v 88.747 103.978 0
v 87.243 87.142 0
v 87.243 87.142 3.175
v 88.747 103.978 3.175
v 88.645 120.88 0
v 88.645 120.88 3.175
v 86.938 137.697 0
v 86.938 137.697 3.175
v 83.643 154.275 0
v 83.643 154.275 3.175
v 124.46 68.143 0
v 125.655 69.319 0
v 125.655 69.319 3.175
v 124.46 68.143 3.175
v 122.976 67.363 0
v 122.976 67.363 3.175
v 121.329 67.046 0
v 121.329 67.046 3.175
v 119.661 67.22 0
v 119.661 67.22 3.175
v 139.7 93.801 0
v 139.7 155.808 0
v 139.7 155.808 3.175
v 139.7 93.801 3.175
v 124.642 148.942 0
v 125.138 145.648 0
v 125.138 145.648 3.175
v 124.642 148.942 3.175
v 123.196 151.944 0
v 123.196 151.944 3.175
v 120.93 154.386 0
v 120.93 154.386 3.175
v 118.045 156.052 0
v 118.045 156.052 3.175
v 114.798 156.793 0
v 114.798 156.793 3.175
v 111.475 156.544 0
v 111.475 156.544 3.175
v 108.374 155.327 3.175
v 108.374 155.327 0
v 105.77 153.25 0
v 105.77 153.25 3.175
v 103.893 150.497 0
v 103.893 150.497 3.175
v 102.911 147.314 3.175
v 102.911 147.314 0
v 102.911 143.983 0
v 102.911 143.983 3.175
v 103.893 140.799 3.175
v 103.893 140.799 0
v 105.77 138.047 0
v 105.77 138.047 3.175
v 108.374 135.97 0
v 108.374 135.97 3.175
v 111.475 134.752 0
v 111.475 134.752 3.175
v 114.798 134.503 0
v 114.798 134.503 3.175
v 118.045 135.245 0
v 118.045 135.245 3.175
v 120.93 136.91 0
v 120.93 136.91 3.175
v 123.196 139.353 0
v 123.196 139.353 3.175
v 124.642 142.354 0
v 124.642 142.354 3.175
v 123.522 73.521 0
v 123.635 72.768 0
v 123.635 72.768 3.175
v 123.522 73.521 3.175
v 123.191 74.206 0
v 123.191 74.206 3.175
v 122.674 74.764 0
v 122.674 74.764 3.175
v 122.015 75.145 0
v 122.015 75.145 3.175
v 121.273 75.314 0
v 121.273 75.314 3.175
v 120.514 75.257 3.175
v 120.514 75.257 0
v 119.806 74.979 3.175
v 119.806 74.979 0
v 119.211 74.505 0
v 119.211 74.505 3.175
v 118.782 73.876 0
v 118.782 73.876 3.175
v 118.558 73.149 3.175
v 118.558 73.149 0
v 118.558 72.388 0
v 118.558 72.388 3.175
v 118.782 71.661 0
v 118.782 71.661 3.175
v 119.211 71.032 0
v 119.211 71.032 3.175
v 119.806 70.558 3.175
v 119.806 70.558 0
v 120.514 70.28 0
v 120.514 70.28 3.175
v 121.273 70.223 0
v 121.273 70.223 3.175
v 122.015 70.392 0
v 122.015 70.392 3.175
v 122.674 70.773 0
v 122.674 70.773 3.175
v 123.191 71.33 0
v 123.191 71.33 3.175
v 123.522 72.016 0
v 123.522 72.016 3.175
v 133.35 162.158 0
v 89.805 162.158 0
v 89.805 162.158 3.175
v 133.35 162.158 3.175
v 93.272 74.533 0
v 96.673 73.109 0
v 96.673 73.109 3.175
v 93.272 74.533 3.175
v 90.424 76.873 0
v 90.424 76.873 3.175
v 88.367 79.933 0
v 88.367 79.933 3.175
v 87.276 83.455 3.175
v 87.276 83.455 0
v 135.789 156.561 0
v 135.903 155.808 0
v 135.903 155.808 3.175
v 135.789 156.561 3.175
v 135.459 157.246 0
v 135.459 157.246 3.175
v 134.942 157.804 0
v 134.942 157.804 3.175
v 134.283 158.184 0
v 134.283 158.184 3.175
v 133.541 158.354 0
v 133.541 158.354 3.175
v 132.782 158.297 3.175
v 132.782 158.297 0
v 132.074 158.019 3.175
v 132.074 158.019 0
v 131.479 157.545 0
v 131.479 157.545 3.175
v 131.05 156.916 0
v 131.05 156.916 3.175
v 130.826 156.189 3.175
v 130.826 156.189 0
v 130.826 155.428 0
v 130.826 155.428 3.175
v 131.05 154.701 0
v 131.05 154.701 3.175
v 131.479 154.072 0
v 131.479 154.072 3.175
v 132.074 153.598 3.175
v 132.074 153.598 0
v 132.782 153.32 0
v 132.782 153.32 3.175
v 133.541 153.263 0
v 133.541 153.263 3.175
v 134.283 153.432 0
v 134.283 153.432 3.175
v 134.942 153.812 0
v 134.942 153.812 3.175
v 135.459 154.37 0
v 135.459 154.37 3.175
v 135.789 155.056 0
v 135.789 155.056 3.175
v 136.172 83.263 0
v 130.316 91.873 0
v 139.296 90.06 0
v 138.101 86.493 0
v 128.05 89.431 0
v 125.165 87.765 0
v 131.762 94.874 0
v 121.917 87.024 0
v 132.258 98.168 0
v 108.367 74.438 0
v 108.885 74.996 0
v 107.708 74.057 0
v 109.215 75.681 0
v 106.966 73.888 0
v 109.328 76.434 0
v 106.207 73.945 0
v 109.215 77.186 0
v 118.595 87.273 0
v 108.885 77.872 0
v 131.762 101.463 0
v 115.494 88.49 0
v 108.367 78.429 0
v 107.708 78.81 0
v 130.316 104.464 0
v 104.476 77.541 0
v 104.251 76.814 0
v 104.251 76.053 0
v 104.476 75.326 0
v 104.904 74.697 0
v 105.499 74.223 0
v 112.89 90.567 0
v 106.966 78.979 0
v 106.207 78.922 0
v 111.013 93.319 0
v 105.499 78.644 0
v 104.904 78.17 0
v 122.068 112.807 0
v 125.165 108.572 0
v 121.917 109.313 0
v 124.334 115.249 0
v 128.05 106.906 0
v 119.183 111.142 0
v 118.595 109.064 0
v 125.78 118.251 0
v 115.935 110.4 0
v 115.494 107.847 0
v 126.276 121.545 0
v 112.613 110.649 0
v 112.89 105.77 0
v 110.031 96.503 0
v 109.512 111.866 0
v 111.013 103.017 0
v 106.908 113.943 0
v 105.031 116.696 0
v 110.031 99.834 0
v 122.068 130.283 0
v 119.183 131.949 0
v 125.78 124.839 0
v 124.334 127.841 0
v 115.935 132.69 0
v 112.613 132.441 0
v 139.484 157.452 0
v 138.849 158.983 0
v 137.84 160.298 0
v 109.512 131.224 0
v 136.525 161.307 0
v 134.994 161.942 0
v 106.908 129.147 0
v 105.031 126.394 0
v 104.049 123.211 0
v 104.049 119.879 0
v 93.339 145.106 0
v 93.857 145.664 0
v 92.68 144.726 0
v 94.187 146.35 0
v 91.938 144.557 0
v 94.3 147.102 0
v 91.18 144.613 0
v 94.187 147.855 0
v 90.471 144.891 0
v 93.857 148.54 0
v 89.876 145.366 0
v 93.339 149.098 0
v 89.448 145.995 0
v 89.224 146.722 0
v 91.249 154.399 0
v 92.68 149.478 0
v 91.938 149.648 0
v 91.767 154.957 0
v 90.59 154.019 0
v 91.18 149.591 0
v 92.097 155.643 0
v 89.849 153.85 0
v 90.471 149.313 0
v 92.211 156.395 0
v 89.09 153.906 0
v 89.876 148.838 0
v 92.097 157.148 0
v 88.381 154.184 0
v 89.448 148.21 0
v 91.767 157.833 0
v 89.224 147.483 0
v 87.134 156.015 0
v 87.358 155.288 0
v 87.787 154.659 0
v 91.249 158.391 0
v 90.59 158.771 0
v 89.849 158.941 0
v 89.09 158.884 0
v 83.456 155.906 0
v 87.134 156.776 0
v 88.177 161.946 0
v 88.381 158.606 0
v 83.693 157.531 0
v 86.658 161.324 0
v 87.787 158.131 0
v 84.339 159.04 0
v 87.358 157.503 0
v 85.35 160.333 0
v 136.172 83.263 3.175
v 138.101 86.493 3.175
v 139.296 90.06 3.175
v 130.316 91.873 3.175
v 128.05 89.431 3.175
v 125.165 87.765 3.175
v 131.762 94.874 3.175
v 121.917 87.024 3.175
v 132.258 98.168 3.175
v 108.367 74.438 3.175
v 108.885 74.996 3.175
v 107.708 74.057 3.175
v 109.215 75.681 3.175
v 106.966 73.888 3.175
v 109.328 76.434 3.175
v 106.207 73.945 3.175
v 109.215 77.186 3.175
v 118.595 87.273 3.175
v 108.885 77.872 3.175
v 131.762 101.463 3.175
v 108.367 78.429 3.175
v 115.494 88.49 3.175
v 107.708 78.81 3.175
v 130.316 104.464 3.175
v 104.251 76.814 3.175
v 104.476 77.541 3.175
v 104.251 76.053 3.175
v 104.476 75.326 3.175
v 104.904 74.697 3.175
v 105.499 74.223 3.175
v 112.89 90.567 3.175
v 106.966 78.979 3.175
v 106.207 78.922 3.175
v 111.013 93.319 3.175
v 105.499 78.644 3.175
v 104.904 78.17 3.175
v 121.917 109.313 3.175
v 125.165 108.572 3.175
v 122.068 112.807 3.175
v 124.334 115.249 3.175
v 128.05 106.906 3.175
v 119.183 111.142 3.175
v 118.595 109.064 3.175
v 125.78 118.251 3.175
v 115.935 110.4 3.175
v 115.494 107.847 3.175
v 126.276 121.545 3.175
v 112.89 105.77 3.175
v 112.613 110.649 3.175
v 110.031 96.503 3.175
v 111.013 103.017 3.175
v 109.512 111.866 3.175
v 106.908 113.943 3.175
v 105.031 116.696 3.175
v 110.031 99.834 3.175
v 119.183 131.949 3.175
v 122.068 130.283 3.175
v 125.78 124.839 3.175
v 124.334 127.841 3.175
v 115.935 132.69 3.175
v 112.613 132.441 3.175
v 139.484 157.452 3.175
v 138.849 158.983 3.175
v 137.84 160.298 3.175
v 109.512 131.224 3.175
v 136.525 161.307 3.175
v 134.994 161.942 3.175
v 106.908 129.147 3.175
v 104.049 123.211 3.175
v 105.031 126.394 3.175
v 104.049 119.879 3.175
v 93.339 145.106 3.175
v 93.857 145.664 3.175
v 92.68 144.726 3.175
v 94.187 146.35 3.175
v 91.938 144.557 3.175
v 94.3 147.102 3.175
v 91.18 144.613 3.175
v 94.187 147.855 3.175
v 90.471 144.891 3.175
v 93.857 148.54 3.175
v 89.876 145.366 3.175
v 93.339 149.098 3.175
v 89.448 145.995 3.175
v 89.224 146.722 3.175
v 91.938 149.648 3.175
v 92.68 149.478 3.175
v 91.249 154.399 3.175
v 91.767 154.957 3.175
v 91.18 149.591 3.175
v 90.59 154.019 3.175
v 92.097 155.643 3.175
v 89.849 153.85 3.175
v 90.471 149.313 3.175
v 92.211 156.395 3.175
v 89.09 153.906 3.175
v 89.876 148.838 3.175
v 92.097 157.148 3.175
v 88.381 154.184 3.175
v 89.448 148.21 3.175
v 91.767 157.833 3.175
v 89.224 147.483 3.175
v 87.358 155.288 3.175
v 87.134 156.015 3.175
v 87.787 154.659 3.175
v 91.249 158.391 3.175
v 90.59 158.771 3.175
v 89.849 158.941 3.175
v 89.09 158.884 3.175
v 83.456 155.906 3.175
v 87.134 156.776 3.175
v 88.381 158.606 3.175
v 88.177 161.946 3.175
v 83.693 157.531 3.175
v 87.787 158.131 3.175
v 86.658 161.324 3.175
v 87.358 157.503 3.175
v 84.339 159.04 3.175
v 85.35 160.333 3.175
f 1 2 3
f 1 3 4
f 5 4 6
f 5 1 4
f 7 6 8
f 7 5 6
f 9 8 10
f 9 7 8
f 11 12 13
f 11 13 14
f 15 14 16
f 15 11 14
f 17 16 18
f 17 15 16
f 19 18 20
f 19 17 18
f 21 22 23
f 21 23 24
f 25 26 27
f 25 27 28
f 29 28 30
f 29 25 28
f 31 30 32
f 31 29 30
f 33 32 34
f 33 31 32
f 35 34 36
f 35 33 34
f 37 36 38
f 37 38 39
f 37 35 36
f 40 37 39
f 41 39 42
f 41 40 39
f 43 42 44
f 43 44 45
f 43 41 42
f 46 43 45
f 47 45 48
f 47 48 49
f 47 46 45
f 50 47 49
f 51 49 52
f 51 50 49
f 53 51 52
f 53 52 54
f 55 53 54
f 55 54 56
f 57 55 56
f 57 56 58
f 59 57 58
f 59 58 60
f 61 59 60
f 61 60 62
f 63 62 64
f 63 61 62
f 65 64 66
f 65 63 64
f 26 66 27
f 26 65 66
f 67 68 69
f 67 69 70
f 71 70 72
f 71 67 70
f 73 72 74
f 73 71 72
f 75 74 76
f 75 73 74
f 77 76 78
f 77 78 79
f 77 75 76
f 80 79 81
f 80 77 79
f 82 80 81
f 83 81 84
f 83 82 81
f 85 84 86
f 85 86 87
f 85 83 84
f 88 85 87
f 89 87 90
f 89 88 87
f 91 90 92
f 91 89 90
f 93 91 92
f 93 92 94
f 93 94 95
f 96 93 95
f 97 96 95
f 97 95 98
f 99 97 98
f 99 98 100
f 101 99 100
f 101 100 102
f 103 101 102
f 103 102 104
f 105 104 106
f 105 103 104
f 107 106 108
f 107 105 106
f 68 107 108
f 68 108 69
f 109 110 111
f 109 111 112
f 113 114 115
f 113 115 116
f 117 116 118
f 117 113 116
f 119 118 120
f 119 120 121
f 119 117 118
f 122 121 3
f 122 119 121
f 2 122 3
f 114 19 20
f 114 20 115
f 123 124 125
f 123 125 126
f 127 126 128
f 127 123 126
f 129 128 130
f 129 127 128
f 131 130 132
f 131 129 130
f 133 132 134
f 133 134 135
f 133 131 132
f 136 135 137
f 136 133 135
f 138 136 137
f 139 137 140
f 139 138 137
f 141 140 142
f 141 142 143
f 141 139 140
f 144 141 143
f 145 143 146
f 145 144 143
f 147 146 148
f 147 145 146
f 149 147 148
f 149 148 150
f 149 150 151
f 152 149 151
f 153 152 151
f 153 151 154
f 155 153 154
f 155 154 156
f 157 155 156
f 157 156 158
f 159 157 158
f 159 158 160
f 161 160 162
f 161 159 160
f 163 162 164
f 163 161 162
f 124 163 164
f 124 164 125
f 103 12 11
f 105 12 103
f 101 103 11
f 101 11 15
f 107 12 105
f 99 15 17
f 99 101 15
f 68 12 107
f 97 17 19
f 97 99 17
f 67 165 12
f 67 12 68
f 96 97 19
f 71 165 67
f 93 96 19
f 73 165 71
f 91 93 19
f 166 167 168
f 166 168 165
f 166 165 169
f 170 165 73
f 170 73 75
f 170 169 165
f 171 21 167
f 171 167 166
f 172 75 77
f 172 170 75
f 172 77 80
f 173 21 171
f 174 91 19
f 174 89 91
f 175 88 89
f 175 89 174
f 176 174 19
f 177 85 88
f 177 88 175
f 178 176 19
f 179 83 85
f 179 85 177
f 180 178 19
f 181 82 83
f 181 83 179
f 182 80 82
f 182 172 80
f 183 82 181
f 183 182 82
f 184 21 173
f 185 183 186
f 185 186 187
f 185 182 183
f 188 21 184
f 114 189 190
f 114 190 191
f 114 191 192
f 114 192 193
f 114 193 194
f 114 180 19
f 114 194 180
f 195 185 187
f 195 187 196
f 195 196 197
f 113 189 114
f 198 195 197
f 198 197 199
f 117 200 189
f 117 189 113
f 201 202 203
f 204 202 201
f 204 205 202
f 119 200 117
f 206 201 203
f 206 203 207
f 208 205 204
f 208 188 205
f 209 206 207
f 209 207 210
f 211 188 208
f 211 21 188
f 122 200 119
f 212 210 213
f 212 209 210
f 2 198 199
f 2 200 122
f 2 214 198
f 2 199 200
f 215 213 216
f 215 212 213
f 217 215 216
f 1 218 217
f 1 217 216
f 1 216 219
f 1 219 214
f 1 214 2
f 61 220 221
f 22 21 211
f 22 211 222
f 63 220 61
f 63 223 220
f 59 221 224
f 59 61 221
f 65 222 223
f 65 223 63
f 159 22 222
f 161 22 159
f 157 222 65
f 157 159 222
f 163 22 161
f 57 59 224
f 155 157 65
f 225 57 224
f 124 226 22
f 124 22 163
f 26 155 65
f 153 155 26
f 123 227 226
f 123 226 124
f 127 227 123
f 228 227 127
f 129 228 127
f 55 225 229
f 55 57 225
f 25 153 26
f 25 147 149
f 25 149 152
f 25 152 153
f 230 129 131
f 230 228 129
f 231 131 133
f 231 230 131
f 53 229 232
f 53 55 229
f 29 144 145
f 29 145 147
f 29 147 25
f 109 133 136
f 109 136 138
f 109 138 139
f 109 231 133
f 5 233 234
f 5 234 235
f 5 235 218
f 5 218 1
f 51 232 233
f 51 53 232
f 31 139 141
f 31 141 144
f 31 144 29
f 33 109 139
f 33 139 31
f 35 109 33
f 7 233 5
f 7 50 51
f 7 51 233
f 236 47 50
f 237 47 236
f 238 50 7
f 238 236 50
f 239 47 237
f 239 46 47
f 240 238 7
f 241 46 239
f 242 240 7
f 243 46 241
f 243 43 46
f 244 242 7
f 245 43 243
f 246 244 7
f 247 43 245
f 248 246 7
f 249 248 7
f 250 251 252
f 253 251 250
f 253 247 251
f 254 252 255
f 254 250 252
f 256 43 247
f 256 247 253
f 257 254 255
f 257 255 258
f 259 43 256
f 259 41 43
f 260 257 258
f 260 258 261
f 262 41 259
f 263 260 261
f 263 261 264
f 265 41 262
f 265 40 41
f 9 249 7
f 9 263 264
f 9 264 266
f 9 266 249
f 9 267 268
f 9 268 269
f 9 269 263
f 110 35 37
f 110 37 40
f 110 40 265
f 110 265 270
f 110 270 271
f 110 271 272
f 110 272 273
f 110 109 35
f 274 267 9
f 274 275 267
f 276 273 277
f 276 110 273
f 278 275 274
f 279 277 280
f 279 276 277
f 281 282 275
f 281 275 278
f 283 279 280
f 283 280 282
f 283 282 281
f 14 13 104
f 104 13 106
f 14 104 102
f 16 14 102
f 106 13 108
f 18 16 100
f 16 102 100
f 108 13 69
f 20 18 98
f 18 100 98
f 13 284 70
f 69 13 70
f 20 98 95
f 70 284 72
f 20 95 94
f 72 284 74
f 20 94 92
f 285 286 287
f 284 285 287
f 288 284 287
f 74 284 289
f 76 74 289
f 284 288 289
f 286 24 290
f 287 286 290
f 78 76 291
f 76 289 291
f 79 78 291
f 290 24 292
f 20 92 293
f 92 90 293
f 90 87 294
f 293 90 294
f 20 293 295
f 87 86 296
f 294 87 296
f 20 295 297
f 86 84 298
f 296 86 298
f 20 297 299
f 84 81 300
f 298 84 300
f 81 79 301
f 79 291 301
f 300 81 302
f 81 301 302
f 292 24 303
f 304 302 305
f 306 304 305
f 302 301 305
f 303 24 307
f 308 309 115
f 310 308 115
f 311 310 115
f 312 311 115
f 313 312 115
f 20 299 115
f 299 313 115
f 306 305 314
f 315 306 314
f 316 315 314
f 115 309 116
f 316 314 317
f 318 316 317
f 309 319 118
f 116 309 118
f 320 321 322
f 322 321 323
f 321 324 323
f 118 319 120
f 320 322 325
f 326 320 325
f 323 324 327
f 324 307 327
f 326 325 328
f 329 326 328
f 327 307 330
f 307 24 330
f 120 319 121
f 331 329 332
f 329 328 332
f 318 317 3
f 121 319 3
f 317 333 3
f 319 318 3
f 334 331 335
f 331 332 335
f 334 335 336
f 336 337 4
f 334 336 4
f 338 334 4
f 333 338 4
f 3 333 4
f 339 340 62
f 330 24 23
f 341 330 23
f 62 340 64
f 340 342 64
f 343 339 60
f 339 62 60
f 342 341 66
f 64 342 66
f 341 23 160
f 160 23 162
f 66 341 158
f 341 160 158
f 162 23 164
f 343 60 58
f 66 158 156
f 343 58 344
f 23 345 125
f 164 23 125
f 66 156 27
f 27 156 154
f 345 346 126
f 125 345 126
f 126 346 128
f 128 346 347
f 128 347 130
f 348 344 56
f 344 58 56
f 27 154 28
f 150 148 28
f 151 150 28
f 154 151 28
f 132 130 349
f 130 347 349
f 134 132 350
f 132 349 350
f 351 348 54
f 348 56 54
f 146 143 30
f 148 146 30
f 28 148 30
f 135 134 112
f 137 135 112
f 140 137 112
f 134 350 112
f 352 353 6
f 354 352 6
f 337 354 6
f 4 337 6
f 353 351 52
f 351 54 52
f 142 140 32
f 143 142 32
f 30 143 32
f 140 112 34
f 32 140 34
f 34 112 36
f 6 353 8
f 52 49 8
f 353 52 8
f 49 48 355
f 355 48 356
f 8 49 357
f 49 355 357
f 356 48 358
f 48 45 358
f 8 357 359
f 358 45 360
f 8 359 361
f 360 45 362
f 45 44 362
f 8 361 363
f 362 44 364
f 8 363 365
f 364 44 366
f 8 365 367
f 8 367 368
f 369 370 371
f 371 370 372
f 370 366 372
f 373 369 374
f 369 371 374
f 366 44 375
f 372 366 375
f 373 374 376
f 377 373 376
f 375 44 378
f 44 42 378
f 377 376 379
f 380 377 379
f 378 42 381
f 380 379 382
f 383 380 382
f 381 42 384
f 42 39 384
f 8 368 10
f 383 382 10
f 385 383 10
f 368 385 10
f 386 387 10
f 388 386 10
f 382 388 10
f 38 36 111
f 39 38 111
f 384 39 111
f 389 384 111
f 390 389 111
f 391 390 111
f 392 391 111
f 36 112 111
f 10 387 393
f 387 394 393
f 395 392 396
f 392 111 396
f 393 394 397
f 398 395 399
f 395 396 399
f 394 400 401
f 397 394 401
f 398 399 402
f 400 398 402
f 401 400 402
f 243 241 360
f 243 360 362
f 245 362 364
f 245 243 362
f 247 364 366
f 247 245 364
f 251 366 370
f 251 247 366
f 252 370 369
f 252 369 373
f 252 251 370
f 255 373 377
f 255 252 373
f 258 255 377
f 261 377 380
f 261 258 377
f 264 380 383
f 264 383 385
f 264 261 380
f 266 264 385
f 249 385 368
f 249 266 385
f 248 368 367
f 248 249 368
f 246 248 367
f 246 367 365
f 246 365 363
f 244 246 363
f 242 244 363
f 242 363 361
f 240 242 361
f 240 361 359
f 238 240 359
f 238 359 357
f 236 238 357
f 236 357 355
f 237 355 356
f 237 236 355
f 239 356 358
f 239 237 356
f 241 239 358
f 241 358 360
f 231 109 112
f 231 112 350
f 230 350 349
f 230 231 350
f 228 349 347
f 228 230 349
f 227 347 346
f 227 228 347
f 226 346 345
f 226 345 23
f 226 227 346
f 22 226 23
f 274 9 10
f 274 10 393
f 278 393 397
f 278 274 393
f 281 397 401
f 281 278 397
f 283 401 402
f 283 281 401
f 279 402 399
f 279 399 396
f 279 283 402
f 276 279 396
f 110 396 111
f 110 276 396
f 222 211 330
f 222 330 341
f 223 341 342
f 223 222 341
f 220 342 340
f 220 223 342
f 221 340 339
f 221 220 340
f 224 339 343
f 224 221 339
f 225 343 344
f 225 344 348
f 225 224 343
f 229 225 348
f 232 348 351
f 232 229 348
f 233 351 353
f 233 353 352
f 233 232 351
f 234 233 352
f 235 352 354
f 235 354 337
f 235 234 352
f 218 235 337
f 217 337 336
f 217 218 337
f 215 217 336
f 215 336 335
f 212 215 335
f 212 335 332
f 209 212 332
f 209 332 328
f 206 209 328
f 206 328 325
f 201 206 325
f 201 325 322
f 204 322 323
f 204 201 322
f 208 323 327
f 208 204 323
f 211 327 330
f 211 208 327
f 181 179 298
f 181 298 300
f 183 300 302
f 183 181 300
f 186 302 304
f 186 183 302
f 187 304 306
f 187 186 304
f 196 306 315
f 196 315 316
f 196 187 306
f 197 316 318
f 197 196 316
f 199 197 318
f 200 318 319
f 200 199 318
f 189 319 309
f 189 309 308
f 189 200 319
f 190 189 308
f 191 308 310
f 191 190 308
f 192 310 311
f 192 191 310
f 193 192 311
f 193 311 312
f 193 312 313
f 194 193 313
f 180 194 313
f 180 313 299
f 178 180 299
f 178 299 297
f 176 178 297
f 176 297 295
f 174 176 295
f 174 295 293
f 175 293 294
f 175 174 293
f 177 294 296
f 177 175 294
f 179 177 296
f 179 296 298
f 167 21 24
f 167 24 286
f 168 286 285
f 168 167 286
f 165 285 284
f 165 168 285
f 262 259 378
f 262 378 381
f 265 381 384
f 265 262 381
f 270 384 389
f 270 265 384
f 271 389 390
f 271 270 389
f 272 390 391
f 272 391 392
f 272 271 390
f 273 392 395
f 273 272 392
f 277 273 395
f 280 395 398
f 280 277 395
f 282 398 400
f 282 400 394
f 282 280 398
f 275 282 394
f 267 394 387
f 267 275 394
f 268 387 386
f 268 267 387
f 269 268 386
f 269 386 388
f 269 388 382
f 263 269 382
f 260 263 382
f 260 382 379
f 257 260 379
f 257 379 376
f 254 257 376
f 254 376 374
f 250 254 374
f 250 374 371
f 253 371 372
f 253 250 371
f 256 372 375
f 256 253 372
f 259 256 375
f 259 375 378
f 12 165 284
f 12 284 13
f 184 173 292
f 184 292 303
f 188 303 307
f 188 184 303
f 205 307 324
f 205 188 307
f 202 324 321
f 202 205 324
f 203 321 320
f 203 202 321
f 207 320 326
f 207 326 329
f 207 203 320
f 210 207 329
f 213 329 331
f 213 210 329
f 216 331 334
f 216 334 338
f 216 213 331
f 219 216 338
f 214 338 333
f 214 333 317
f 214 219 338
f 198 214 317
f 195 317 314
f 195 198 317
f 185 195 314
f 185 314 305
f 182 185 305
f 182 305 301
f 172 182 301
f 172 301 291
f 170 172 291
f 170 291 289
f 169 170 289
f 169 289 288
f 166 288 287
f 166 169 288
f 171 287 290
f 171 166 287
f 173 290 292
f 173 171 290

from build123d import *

# Parameters (mm, degrees)
SKETCH2_R           = 2.5527
SKETCH2_R_2         = 11.176
BOSS_EXTRUDE1_DEPTH = 3.175


with BuildPart() as part:
    # Sketch2 → Boss-Extrude1 (new body)
    with BuildSketch(Plane.XY):
        with BuildLine():
            Line((89.804840449, 162.158224077), (133.35, 162.158224077))
            ThreePointArc((133.35, 162.158224077), (137.840128061, 160.298352138), (139.7, 155.808224077))
            Line((139.7, 155.808224077), (139.7, 93.800599977))
            ThreePointArc((139.7, 93.800599977), (138.794482451, 88.24423856), (136.171639749, 83.262892317))
            Line((136.171639749, 83.262892317), (125.655155155, 69.319391612))
            ThreePointArc((125.655155155, 69.319391612), (122.975635879, 67.362639494), (119.660773298, 67.219851313))
            Line((119.660773298, 67.219851313), (96.672878026, 73.109258508))
            ThreePointArc((96.672878026, 73.109258508), (89.283742308, 78.328372298), (87.243120334, 87.141676865))
            ThreePointArc((87.243120334, 87.141676865), (88.644839635, 120.88029943), (83.642604572, 154.275465457))
            ThreePointArc((83.642604572, 154.275465457), (84.802065357, 159.719073266), (89.804840449, 162.158224077))
        make_face()
        with Locations((89.657841737, 156.395094021)):
            Circle(SKETCH2_R, mode=Mode.SUBTRACT)
        with Locations((91.747700228, 147.102187237)):
            Circle(SKETCH2_R, mode=Mode.SUBTRACT)
        with Locations((106.775437357, 76.433708644)):
            Circle(SKETCH2_R, mode=Mode.SUBTRACT)
        with Locations((115.1001, 121.545060726)):
            Circle(SKETCH2_R_2, mode=Mode.SUBTRACT)
        with Locations((113.962375762, 145.648224077)):
            Circle(SKETCH2_R_2, mode=Mode.SUBTRACT)
        with Locations((133.35, 155.808224077)):
            Circle(SKETCH2_R, mode=Mode.SUBTRACT)
        with Locations((121.082277384, 72.768353221)):
            Circle(SKETCH2_R, mode=Mode.SUBTRACT)
        with Locations((121.082277384, 98.168353221)):
            Circle(SKETCH2_R_2, mode=Mode.SUBTRACT)
    extrude(amount=BOSS_EXTRUDE1_DEPTH)


solid = part.part
